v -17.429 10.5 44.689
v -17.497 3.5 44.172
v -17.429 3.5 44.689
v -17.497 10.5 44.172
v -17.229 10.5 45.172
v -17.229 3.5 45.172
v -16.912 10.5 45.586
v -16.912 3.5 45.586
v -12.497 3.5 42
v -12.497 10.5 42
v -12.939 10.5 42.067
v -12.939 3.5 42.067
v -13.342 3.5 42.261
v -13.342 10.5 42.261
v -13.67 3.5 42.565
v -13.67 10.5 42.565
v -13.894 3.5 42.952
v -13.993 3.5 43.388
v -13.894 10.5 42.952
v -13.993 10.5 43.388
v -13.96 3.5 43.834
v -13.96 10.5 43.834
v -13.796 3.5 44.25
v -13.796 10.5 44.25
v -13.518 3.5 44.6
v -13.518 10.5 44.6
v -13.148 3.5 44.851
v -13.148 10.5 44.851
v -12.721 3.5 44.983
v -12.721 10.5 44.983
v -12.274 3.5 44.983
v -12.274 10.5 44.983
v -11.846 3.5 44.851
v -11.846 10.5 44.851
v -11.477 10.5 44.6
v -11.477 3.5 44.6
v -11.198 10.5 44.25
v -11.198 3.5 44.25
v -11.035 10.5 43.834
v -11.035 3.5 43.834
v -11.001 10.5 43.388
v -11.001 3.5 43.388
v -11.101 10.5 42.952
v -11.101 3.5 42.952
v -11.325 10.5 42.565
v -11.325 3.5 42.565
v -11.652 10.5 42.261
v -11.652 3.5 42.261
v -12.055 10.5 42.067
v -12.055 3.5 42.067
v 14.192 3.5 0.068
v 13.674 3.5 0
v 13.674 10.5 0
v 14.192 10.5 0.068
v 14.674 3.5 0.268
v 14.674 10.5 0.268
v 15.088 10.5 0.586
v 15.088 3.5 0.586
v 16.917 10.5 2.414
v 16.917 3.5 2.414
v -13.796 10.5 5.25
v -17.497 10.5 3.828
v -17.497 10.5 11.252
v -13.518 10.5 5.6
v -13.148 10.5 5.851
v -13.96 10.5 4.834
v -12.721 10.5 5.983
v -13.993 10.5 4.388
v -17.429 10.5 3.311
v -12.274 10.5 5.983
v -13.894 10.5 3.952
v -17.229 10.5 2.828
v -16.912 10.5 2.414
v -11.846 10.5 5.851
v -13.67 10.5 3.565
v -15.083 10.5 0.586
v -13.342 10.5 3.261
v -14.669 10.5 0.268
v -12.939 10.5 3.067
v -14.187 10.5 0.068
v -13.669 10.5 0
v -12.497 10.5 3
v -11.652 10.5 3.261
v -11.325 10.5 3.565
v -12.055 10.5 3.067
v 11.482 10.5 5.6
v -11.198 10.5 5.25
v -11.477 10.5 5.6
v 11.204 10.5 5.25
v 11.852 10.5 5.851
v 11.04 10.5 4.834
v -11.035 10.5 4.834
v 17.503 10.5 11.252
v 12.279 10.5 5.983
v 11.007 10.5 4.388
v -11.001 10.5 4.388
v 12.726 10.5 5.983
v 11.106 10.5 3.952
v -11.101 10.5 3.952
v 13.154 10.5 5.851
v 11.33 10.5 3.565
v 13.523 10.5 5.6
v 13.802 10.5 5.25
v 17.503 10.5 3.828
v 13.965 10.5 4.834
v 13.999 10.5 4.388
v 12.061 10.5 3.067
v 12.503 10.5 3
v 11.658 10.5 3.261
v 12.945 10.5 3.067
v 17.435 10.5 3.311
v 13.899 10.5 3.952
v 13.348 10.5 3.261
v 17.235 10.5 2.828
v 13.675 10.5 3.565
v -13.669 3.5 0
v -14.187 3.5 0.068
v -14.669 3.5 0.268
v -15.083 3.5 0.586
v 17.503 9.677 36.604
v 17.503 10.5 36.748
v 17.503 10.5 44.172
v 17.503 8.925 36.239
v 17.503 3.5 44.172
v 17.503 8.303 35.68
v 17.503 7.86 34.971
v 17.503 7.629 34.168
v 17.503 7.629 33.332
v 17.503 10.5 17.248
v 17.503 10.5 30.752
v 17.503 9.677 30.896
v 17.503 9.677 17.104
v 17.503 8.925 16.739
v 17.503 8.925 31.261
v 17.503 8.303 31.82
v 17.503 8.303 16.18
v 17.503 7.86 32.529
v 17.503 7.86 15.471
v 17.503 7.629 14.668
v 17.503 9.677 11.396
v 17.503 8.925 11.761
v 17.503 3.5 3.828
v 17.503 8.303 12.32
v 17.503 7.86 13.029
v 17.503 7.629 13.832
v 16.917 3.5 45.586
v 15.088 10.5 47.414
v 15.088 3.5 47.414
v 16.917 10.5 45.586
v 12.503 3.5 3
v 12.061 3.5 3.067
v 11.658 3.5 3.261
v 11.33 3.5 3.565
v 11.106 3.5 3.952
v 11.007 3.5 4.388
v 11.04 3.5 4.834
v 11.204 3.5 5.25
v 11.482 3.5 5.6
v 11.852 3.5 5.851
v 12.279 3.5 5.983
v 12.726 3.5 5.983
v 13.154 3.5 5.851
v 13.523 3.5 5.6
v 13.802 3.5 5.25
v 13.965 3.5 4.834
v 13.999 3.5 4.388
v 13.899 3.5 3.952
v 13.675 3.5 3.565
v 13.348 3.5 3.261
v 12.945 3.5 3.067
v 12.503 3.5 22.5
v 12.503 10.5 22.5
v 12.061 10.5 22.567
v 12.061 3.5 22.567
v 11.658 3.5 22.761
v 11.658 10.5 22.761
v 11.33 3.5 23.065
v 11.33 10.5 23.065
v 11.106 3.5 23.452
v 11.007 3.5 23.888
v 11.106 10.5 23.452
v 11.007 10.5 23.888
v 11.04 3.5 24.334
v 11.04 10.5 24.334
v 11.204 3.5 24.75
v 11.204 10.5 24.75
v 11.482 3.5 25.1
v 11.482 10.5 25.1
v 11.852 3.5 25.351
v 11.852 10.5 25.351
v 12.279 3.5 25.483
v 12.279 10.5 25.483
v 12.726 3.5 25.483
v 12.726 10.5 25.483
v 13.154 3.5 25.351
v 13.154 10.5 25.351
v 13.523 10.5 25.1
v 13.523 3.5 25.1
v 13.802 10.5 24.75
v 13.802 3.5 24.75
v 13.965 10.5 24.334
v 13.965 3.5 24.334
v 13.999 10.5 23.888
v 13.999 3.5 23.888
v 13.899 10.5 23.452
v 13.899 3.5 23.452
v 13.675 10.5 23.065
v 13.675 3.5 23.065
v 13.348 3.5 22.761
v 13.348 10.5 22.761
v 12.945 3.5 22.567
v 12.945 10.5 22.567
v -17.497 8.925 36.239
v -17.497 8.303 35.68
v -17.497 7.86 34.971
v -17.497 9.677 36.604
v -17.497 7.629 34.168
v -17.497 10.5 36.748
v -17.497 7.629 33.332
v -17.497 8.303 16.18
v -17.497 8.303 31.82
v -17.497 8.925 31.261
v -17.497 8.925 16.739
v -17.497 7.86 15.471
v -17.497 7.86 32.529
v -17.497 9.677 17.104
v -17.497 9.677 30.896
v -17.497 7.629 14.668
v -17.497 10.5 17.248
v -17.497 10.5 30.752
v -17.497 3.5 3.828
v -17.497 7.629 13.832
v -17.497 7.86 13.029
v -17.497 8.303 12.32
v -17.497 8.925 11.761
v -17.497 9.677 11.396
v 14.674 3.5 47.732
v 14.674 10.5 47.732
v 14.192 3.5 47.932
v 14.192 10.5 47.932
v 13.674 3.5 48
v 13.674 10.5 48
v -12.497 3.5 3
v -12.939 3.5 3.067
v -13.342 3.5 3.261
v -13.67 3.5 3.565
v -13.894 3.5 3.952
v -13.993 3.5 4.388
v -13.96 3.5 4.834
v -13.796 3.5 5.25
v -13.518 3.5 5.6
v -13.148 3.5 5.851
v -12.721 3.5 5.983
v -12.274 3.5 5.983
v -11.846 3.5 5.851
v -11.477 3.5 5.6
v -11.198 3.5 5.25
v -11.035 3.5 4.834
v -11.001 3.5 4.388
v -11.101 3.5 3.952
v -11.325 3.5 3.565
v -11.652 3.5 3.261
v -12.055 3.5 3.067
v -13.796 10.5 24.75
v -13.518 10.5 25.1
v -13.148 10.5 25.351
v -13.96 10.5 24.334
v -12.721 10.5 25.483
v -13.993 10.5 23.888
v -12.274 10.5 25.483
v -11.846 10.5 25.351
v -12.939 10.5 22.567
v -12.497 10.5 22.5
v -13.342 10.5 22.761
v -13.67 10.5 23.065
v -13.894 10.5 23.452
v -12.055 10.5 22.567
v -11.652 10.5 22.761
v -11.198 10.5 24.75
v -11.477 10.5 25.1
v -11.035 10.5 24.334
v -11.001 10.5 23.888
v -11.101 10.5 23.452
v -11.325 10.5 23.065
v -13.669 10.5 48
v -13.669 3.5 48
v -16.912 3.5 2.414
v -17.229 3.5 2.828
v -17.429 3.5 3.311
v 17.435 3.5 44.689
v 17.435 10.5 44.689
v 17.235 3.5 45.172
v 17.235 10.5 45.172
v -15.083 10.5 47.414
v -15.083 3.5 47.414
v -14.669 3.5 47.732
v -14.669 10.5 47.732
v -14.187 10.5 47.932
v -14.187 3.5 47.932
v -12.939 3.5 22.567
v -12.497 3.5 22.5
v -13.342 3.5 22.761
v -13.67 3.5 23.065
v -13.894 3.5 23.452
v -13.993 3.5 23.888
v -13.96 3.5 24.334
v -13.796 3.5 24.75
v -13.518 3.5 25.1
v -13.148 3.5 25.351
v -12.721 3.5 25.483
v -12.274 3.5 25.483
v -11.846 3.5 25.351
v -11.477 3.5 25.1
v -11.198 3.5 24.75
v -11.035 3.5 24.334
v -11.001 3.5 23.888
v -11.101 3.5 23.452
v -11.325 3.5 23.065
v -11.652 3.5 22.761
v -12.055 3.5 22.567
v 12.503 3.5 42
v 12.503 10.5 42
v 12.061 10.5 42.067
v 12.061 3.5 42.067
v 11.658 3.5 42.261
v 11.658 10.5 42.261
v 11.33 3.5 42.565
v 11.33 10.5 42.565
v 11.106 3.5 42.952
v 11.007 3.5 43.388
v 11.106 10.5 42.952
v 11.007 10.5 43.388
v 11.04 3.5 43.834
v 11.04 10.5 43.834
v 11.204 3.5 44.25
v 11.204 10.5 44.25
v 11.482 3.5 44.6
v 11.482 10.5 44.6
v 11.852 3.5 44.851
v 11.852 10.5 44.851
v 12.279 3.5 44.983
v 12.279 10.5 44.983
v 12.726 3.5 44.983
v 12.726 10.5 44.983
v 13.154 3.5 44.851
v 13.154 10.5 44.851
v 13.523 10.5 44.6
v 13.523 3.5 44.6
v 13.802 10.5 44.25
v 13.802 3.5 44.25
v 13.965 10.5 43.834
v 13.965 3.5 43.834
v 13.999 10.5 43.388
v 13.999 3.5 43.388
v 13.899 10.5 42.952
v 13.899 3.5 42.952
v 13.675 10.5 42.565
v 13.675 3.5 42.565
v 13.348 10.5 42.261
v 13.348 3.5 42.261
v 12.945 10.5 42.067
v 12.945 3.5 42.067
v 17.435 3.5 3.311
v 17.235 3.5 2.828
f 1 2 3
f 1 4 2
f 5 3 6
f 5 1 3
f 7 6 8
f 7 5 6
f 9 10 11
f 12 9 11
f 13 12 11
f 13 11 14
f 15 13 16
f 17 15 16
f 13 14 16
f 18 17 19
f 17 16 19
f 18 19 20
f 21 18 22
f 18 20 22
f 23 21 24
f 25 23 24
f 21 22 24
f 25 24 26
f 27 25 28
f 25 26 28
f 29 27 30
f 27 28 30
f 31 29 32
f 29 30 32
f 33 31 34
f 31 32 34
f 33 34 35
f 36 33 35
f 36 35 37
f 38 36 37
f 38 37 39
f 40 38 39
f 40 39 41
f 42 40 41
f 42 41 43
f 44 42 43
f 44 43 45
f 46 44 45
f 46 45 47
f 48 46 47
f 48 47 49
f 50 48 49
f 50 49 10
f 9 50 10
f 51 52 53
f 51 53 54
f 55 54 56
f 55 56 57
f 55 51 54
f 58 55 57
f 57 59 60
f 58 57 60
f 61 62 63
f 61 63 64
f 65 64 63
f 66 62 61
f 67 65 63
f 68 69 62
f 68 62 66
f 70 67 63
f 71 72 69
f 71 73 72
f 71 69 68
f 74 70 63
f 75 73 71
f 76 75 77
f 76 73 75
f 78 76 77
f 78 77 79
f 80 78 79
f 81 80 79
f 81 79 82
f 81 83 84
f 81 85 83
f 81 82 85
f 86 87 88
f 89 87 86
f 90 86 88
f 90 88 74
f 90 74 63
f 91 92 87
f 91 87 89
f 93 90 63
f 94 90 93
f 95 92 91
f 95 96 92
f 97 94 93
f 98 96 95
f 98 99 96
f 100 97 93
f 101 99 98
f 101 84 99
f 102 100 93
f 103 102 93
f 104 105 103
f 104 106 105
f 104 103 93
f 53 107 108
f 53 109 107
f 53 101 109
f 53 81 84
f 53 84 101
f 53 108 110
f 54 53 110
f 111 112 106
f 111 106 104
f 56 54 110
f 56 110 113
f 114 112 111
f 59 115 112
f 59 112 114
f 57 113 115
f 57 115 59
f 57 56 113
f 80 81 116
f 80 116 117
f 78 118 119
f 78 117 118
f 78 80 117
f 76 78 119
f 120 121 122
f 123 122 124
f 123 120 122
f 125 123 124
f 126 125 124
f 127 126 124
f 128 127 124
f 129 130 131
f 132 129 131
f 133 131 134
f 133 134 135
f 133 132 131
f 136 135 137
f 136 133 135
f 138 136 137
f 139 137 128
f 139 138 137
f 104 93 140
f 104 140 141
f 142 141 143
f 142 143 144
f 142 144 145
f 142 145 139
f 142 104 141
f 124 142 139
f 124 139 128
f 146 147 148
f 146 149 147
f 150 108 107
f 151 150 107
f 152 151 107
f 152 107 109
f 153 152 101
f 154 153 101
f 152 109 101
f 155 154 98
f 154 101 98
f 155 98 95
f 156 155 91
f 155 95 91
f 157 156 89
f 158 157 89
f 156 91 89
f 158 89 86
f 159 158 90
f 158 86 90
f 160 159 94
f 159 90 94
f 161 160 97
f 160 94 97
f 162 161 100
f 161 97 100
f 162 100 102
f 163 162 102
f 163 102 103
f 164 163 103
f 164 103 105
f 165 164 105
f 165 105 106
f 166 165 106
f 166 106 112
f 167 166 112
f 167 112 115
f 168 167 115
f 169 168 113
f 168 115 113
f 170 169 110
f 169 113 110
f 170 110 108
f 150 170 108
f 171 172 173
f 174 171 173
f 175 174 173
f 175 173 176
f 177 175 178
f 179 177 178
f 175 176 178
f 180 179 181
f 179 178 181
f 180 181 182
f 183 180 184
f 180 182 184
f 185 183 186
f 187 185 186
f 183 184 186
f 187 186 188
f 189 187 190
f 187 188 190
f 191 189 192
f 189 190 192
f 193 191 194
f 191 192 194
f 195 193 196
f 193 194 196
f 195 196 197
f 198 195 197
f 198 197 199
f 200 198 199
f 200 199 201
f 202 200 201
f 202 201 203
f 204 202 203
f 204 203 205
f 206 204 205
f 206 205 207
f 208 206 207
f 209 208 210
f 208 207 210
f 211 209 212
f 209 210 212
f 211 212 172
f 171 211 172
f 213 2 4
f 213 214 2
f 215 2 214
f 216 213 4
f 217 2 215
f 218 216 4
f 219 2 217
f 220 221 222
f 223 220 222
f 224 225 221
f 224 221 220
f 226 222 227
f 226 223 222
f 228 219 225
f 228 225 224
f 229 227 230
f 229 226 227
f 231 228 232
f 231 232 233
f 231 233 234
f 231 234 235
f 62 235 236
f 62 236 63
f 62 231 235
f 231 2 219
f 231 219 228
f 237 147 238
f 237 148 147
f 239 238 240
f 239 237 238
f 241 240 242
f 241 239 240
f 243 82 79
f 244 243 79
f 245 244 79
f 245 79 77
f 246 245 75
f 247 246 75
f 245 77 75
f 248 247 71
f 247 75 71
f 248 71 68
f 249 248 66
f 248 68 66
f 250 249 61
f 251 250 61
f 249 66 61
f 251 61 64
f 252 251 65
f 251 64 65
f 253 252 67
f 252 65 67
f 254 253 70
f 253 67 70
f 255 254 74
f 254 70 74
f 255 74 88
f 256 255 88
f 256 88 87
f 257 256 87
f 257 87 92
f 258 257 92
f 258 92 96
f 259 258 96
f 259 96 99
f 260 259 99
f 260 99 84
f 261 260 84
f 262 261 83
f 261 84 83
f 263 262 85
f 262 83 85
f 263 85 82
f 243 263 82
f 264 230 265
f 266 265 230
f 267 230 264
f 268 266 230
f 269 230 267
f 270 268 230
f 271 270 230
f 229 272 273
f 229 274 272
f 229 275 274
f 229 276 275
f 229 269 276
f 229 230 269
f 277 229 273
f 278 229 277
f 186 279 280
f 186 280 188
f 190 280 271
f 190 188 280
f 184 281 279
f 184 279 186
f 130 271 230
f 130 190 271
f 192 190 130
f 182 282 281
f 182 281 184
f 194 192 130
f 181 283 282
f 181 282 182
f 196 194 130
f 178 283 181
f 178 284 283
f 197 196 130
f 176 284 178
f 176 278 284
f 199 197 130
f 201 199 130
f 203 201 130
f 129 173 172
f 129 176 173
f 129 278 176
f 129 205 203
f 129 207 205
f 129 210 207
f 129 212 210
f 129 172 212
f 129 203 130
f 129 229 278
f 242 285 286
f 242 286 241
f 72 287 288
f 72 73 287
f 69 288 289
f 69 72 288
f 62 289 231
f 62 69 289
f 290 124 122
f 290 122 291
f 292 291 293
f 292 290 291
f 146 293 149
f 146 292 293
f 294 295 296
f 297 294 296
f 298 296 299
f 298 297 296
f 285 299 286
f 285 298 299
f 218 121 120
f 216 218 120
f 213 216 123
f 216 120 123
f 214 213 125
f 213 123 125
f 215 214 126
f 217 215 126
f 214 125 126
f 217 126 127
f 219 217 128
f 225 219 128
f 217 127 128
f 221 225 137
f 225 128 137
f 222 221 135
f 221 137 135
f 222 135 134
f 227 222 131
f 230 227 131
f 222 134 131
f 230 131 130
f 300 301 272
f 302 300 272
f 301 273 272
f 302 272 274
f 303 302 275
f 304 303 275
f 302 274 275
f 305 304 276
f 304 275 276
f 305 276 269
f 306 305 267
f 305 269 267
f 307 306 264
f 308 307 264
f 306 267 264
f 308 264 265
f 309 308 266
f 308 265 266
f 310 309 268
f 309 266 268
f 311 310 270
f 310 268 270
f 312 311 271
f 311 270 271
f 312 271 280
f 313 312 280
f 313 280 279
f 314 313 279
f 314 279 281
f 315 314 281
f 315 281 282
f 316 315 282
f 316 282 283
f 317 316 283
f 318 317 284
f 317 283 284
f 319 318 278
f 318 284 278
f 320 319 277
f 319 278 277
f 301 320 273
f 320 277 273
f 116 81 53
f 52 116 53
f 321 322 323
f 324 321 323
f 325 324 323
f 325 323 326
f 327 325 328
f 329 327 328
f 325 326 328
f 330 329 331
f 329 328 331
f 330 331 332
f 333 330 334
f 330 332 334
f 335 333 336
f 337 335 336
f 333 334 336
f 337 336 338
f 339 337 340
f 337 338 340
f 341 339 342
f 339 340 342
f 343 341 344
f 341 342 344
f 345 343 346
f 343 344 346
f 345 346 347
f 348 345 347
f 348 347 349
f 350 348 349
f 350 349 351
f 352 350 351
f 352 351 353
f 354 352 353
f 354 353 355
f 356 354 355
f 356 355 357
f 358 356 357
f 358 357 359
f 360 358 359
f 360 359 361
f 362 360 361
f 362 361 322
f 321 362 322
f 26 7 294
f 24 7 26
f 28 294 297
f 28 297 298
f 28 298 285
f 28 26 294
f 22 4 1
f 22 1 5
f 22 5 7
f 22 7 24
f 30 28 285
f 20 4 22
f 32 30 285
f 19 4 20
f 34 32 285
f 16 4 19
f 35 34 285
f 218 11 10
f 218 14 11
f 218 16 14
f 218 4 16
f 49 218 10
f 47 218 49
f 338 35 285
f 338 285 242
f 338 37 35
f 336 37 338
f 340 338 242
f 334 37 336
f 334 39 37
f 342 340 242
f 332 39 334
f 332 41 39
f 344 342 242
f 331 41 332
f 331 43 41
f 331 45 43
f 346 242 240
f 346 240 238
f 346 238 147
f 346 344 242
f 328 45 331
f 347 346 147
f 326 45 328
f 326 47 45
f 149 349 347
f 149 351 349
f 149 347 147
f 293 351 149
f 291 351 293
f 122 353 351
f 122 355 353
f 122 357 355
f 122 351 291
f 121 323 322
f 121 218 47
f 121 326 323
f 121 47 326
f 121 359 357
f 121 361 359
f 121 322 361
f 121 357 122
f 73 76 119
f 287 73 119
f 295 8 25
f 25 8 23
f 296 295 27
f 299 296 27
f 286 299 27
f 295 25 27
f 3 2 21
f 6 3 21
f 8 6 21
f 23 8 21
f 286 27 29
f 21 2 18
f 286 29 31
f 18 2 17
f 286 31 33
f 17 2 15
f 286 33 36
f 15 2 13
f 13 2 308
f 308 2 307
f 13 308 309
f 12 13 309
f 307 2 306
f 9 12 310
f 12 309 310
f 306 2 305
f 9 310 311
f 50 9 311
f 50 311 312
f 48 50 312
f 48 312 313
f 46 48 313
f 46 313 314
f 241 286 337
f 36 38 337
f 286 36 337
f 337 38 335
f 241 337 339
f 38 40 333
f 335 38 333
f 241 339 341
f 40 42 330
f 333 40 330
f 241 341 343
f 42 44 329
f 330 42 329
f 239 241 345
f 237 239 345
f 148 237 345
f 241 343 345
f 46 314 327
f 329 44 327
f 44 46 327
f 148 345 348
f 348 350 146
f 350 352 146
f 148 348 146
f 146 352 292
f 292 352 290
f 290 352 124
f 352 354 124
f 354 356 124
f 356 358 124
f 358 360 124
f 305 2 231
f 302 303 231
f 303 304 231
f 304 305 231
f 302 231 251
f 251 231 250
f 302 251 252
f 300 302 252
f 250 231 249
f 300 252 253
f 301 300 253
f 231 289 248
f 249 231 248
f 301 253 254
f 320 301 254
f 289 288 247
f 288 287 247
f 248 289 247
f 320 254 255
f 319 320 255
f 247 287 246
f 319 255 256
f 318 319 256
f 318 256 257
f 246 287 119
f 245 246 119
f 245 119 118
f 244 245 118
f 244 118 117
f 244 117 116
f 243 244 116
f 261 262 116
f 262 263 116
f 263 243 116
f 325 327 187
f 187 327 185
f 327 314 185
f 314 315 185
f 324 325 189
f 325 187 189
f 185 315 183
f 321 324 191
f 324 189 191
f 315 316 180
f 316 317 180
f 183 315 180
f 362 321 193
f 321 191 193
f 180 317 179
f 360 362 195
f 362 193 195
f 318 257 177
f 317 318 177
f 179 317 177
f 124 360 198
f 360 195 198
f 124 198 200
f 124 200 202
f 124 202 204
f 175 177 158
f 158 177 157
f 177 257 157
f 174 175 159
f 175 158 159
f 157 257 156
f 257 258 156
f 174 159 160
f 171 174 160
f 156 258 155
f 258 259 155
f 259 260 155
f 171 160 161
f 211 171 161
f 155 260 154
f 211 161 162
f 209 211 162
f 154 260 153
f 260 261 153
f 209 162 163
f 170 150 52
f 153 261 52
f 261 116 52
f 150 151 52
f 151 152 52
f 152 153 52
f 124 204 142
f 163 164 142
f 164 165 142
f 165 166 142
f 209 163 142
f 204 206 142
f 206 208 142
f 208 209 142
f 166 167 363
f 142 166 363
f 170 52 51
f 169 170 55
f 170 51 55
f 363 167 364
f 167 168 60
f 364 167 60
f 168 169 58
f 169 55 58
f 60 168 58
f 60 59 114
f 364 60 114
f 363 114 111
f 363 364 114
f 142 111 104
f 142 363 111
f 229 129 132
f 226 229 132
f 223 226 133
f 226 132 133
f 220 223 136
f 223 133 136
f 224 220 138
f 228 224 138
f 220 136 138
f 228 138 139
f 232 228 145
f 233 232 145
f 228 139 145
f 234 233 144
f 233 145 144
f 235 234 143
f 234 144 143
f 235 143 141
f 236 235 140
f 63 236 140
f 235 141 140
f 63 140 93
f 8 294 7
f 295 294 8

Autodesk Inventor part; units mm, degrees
ref_plane "YZ Plane" through (0, 0, 0) normal (1, 0, 0) x (0, 1, 0)
ref_plane "XZ Plane" through (0, 0, 0) normal (0, 1, 0) x (-1, 0, 0)
ref_plane "XY Plane" through (0, 0, 0) normal (0, 0, 1) x (1, 0, 0)
sketch "Sketch1" plane through (0, 0, 0) normal (0, 0, 1) x (1, 0, 0)
  line L0 (-17.4973, 3.5) -> (-17.4973, 10.5)
  line L1 (-17.4973, 10.5) -> (17.5027, 10.5)
  line L2 (17.5027, 10.5) -> (17.5027, 3.5)
  line L3 (-17.4973, 3.5) -> (17.5027, 3.5)
  dimension "d50" = 35
  dimension "d51" = 7
extrude "Extrusion1" add sketch "Sketch1" along normal blind 48
sketch "Sketch4" plane through (-17.4973, 3.5, 0) normal (0, -1, 0) x (1, 0, 0)
  line L0 (35, 0) -> (0, 0) projected
  line L1 (35, 0) -> (35, 48) projected
  line L2 (0, 48) -> (35, 48) projected
  line L3 (0, 0) -> (0, 48) projected
  point P0 (5, 4.5)
  point P1 (5, 24)
  point P2 (5, 43.5)
  point P3 (30, 4.5)
  point P4 (30, 24)
  point P5 (30, 43.5)
  dimension "d52" = 4.5
  dimension "d53" = 4.5
  dimension "d54" = 5
  dimension "d55" = 5
  dimension "d56" = 24
hole "Hole2" at (-12.4973, 3.5, 4.5) at (-12.4973, 3.5, 24) at (-12.4973, 3.5, 43.5) at (12.5027, 3.5, 4.5) at (12.5027, 3.5, 24) at (12.5027, 3.5, 43.5) direction (0, 1, 0) diameter 3 end through all
sketch "Sketch5" plane through (17.5027, 3.5, 0) normal (1, 0, 0) x (0, 0, -1)
  circle A0 centre (-14.25, 7.1) radius 3
  circle A1 centre (-33.75, 7.1) radius 3
  line L0 (0, 7) -> (0, 0) projected
  line L1 (0, 7) -> (-48, 7) projected
  line L2 (-48, 0) -> (-48, 7) projected
  line L3 (0, 0) -> (-48, 0) projected
  point P0 (0, -3.5)
  dimension "d64" = 6
  dimension "d65" = 6
  dimension "d66" = 0.1
  dimension "d67" = 0.1
  dimension "d68" = 14.25
  dimension "d69" = 14.25
extrude "Extrusion3" cut sketch "Sketch5" against normal up to next contours A0 L1 | L1 A0 | L1 A1 | A1 L1
chamfer "Chamfer1" distance 3 angle 45 4 edges at (-17.4973, 7, 0) (-17.4973, 7, 48) (17.5027, 7, 48) (17.5027, 7, 0)
fillet "Fillet2" radius 2 8 edges at (-17.4973, 7, 3) (-14.4973, 7, 0) (-17.4973, 7, 45) (-14.4973, 7, 48) (14.5027, 7, 48) (17.5027, 7, 45) (14.5027, 7, 0) (17.5027, 7, 3)
equation "\"d53\" = d52"
equation "\"d55\" = d54"
equation "\"d69\" = d68"
properties part number "3DP_PLA_X_end_top_linear_shaft_clamp" material "ABS Plastic"
